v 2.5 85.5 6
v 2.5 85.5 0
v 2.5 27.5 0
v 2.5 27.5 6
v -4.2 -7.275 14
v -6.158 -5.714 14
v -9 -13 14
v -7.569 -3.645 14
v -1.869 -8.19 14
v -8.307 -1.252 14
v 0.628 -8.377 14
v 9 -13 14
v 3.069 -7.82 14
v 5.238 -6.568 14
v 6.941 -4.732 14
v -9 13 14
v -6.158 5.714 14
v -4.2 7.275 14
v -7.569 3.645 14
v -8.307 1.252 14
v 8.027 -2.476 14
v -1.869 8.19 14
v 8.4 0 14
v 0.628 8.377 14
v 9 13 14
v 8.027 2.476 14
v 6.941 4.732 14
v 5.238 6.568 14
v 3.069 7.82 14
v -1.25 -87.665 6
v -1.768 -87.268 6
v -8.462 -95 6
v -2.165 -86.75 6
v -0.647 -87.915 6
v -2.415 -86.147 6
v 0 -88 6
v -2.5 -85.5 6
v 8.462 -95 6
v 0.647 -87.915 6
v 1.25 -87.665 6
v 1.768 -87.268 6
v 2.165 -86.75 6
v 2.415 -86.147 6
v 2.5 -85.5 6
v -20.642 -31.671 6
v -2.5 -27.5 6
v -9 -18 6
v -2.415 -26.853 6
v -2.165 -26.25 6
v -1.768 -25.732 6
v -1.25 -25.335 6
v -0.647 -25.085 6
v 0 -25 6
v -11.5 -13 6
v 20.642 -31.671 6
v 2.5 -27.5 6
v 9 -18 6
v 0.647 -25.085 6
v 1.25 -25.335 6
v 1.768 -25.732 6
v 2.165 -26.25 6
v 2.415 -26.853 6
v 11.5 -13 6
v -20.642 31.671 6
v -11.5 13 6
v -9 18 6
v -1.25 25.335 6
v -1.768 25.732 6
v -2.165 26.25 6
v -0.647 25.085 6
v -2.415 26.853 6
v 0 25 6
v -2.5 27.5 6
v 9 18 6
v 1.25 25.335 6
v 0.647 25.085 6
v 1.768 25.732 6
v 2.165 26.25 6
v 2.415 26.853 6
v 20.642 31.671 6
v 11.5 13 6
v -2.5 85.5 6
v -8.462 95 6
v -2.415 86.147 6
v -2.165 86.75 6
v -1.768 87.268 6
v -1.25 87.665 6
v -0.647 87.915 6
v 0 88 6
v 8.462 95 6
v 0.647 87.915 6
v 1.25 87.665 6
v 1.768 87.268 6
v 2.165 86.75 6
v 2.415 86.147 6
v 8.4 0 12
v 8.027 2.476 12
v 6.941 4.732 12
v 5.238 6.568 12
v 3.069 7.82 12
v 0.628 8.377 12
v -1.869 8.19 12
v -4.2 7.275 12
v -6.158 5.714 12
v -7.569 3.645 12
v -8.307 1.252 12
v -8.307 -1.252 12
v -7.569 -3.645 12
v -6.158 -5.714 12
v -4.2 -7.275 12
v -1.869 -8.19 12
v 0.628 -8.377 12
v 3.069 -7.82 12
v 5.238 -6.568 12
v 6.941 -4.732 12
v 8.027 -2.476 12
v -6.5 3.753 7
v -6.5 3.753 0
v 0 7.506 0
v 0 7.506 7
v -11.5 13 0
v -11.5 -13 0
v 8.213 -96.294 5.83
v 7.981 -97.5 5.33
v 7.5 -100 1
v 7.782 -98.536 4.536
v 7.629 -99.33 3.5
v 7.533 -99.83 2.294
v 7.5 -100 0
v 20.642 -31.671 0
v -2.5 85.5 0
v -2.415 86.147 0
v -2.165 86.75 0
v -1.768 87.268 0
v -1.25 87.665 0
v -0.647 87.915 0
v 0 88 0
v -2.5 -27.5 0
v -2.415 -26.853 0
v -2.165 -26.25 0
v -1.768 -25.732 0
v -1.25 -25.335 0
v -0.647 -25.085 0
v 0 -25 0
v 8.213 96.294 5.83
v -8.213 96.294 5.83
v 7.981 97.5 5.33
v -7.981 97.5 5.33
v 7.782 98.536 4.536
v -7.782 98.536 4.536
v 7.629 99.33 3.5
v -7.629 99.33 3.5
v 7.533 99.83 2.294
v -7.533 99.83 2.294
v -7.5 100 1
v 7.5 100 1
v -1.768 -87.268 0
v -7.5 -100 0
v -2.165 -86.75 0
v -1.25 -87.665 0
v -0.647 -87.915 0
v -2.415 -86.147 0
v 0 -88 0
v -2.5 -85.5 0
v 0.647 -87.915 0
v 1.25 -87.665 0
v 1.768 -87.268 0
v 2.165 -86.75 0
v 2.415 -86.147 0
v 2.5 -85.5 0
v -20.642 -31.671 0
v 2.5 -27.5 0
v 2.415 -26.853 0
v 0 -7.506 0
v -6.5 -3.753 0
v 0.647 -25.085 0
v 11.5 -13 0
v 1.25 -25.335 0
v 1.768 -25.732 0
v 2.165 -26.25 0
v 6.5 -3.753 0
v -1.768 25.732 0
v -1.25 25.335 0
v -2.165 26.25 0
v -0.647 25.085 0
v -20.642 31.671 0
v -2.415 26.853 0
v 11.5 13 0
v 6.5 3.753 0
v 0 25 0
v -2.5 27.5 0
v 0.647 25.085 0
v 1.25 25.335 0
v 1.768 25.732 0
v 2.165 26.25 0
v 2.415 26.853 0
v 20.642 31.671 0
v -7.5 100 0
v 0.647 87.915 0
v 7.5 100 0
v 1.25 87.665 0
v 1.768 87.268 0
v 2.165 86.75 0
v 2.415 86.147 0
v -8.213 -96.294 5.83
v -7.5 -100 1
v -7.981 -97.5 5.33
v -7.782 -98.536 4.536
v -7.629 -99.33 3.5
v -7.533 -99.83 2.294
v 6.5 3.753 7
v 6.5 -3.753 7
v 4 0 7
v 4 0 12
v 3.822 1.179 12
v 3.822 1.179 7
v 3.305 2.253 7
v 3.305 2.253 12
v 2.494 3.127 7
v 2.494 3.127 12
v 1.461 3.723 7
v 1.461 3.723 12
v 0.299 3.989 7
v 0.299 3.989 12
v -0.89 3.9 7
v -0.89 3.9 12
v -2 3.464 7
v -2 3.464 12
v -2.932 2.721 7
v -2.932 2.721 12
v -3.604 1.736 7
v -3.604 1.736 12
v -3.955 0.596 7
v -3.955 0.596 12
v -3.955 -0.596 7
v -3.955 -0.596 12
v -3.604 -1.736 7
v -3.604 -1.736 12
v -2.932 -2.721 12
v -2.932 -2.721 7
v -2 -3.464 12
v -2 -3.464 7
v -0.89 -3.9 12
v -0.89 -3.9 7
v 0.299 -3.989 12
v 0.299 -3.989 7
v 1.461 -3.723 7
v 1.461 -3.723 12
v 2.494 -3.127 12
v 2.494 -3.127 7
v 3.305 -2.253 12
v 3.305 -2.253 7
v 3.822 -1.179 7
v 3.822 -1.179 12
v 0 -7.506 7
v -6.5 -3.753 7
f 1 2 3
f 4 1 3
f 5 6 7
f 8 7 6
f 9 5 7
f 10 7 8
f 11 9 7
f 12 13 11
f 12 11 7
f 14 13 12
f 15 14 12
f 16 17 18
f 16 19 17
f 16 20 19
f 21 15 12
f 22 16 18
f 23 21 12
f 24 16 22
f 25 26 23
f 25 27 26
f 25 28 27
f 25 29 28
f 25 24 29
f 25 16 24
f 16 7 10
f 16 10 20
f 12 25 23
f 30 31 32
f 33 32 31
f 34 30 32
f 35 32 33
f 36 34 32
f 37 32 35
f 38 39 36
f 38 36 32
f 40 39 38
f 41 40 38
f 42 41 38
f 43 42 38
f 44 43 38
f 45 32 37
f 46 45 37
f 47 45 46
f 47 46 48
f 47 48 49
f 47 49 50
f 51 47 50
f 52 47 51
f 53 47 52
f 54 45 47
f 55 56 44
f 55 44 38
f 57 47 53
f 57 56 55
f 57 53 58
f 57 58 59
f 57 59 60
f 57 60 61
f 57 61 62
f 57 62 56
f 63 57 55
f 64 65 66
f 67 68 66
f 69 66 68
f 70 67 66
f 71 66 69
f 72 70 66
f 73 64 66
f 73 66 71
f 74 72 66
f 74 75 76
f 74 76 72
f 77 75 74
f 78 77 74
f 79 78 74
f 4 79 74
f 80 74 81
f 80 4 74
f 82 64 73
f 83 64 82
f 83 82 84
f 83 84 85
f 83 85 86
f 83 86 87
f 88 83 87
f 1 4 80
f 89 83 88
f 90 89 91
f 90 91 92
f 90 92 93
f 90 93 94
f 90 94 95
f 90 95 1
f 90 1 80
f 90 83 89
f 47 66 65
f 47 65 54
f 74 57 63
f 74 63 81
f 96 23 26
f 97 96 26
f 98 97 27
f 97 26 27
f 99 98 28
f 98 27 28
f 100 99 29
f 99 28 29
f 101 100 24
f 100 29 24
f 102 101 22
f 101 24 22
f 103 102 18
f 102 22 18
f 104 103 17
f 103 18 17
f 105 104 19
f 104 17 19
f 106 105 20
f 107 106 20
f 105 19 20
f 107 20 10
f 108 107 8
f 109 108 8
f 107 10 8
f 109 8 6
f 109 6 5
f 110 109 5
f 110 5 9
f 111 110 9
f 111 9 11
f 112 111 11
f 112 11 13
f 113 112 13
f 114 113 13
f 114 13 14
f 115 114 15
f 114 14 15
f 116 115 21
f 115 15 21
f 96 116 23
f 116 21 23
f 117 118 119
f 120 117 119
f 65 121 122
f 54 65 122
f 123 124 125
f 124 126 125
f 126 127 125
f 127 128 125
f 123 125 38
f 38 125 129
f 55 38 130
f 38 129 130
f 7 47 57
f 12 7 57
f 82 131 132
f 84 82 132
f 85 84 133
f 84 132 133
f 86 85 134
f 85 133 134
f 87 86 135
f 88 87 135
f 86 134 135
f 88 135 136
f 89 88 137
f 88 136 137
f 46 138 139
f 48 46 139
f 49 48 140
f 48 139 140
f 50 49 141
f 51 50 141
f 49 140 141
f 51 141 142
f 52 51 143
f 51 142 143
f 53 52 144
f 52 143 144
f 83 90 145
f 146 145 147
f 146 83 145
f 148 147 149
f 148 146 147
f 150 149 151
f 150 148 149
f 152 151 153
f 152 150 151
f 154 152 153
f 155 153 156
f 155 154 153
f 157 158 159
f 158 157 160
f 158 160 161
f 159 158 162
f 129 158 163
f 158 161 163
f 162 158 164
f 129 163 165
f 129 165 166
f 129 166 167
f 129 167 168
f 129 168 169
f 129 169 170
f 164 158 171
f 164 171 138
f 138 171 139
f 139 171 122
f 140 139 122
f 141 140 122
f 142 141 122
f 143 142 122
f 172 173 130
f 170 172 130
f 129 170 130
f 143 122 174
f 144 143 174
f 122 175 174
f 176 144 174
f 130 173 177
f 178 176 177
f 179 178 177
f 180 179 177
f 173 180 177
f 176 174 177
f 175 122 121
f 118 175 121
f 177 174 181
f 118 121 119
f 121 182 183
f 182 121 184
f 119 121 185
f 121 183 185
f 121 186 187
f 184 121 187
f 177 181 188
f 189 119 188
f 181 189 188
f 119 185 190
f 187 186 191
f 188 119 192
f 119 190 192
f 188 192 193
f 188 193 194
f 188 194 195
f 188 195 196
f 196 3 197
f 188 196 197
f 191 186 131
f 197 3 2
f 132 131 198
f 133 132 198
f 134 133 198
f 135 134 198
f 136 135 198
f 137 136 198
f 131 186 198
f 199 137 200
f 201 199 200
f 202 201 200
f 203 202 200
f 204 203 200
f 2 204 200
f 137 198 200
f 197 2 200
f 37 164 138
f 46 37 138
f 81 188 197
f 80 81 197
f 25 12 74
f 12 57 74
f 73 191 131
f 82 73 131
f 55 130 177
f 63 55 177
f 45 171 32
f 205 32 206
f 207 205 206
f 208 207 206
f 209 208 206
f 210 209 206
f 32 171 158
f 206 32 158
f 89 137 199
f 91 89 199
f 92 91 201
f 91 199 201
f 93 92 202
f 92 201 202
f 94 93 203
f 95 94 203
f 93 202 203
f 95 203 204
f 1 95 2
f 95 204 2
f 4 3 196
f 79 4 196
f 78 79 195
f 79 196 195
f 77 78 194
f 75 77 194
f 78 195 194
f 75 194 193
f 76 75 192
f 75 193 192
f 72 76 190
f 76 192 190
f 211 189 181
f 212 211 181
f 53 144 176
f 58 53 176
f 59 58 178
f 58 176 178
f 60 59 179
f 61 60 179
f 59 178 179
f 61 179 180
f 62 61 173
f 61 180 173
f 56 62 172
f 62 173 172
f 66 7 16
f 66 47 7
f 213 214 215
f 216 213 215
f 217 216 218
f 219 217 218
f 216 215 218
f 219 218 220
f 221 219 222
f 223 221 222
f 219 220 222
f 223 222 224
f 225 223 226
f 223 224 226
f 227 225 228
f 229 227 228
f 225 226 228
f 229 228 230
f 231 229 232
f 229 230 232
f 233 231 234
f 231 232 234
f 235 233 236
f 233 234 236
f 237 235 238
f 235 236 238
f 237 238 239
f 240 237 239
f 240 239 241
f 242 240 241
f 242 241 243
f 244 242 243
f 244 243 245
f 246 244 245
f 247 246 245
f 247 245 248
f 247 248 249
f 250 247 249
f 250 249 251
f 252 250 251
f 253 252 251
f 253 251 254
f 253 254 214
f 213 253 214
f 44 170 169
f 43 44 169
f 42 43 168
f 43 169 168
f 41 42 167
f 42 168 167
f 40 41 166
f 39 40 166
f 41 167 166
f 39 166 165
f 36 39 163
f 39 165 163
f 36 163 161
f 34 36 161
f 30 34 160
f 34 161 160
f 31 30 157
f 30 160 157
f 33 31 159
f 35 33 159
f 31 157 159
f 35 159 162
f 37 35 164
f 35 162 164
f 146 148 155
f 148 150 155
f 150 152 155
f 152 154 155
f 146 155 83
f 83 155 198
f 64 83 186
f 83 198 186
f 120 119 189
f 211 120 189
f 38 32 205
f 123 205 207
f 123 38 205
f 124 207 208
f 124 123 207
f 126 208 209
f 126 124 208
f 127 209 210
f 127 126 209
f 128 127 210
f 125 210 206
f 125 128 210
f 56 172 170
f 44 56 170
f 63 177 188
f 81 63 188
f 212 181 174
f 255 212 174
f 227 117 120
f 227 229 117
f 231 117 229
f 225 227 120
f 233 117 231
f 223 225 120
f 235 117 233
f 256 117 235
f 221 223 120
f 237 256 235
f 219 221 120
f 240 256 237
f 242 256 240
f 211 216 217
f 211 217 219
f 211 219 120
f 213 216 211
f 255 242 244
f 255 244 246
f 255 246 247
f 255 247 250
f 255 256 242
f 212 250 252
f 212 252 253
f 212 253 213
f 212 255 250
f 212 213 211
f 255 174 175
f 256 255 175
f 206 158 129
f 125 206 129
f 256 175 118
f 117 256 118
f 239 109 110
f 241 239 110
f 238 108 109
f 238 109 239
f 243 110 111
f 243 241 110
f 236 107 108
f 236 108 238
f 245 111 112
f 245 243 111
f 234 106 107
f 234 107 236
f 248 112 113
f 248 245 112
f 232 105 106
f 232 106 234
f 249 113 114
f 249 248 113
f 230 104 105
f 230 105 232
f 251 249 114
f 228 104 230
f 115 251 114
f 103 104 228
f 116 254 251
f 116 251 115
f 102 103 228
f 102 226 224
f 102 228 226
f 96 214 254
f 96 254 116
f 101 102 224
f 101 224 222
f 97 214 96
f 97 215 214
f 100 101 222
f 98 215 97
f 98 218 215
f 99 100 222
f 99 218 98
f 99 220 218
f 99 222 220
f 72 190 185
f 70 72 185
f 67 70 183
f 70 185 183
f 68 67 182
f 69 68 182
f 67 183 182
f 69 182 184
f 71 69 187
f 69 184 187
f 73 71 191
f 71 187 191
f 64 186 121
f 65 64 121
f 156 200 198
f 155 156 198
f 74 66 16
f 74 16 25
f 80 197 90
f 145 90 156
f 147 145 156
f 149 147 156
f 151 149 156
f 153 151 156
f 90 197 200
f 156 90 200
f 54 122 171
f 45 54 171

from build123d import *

# Parameters (mm, degrees)
F1_DEPTH  = 6
F2_W      = 18
F2_H      = 36
F3_DEPTH  = 8
F4_SIZE2  = 7.99999
F4_SIZE   = 4.99999
F6_DEPTH  = 1
F7_R      = 8.4004464167
F8_DEPTH  = 2
F9_R      = 4
F10_DEPTH = 25
F11_R     = 5


# Not quite as in the source:
# - a fillet or chamfer is up to 0.001 mm smaller than in the source, because OpenCascade refuses the exact size


with BuildPart() as f1:
    # F0 (on Top) → F1 (new body)
    with BuildSketch(Plane.XY):
        Polygon((7.5, 100), (-7.5, 100), (-20.6415709108, 31.671449542), (-11.5, 13), (-11.5, -13), (-20.6415709108, -31.671449542), (-7.5, -100), (7.5, -100), (20.6415709108, -31.671449542), (11.5, -13), (11.5, 13), (20.6415709108, 31.671449542), align=None)
        with BuildLine():
            ThreePointArc((0, -88), (-1.767766953, -87.267766953), (-2.5, -85.5))
            Line((-2.5, -85.5), (-2.5, -27.5))
            ThreePointArc((-2.5, -27.5), (-1.767766953, -25.732233047), (0, -25))
            ThreePointArc((0, -25), (1.767766953, -25.732233047), (2.5, -27.5))
            Line((2.5, -27.5), (2.5, -85.5))
            ThreePointArc((2.5, -85.5), (1.767766953, -87.267766953), (0, -88))
        make_face(mode=Mode.SUBTRACT)
        Polygon((-6.5, 3.7527767497), (0, 7.5055534995), (6.5, 3.7527767497), (6.5, -3.7527767497), (0, -7.5055534995), (-6.5, -3.7527767497), align=None, mode=Mode.SUBTRACT)
        with BuildLine():
            ThreePointArc((0, 25), (-1.767766953, 25.732233047), (-2.5, 27.5))
            Line((-2.5, 27.5), (-2.5, 85.5))
            ThreePointArc((-2.5, 85.5), (-1.767766953, 87.267766953), (0, 88))
            ThreePointArc((0, 88), (1.767766953, 87.267766953), (2.5, 85.5))
            Line((2.5, 85.5), (2.5, 27.5))
            ThreePointArc((2.5, 27.5), (1.767766953, 25.732233047), (0, 25))
        make_face(mode=Mode.SUBTRACT)
    extrude(amount=F1_DEPTH)

    # F2 (on face) → F3 (join)
    with BuildSketch(Plane.XY.offset(6)):
        Rectangle(F2_W, F2_H)
    extrude(amount=F3_DEPTH)

    # F4 (size 5 and 8 in the source; OpenCascade refuses exactly that, so slightly less here)
    f4_edges = [f1.edges().sort_by_distance(p)[0] for p in [
        (0, -18, 14),
        (0, 18, 14),
    ]]
    f4_side = f1.faces().sort_by_distance((0, 0, 14))[0]
    chamfer(f4_edges, length=F4_SIZE, length2=F4_SIZE2, reference=f4_side)

    # F5 (on face) → F6 (cut)
    with BuildSketch(Plane(origin=(0, 0, 6), x_dir=(1, 0, 0), z_dir=(0, 0, -1))):
        Polygon((6.5, 3.7527767497), (0, 7.5055534995), (-6.5, 3.7527767497), (-6.5, -3.7527767497), (0, -7.5055534995), (6.5, -3.7527767497), align=None)
    extrude(amount=-F6_DEPTH, mode=Mode.SUBTRACT)

    # F7 (on face) → F8 (cut)
    with BuildSketch(Plane.XY.offset(14)):
        Circle(F7_R)
    extrude(amount=-F8_DEPTH, mode=Mode.SUBTRACT)

    # F9 (on face) → F10 (cut)
    with BuildSketch(Plane.XY.offset(12)):
        Circle(F9_R)
    extrude(amount=-F10_DEPTH, mode=Mode.SUBTRACT)

    # F11
    f11_edges = [f1.edges().sort_by_distance(p)[0] for p in [
        (0, -100, 6),
        (0, 100, 6),
    ]]
    fillet(f11_edges, radius=F11_R)


solid = f1.part
